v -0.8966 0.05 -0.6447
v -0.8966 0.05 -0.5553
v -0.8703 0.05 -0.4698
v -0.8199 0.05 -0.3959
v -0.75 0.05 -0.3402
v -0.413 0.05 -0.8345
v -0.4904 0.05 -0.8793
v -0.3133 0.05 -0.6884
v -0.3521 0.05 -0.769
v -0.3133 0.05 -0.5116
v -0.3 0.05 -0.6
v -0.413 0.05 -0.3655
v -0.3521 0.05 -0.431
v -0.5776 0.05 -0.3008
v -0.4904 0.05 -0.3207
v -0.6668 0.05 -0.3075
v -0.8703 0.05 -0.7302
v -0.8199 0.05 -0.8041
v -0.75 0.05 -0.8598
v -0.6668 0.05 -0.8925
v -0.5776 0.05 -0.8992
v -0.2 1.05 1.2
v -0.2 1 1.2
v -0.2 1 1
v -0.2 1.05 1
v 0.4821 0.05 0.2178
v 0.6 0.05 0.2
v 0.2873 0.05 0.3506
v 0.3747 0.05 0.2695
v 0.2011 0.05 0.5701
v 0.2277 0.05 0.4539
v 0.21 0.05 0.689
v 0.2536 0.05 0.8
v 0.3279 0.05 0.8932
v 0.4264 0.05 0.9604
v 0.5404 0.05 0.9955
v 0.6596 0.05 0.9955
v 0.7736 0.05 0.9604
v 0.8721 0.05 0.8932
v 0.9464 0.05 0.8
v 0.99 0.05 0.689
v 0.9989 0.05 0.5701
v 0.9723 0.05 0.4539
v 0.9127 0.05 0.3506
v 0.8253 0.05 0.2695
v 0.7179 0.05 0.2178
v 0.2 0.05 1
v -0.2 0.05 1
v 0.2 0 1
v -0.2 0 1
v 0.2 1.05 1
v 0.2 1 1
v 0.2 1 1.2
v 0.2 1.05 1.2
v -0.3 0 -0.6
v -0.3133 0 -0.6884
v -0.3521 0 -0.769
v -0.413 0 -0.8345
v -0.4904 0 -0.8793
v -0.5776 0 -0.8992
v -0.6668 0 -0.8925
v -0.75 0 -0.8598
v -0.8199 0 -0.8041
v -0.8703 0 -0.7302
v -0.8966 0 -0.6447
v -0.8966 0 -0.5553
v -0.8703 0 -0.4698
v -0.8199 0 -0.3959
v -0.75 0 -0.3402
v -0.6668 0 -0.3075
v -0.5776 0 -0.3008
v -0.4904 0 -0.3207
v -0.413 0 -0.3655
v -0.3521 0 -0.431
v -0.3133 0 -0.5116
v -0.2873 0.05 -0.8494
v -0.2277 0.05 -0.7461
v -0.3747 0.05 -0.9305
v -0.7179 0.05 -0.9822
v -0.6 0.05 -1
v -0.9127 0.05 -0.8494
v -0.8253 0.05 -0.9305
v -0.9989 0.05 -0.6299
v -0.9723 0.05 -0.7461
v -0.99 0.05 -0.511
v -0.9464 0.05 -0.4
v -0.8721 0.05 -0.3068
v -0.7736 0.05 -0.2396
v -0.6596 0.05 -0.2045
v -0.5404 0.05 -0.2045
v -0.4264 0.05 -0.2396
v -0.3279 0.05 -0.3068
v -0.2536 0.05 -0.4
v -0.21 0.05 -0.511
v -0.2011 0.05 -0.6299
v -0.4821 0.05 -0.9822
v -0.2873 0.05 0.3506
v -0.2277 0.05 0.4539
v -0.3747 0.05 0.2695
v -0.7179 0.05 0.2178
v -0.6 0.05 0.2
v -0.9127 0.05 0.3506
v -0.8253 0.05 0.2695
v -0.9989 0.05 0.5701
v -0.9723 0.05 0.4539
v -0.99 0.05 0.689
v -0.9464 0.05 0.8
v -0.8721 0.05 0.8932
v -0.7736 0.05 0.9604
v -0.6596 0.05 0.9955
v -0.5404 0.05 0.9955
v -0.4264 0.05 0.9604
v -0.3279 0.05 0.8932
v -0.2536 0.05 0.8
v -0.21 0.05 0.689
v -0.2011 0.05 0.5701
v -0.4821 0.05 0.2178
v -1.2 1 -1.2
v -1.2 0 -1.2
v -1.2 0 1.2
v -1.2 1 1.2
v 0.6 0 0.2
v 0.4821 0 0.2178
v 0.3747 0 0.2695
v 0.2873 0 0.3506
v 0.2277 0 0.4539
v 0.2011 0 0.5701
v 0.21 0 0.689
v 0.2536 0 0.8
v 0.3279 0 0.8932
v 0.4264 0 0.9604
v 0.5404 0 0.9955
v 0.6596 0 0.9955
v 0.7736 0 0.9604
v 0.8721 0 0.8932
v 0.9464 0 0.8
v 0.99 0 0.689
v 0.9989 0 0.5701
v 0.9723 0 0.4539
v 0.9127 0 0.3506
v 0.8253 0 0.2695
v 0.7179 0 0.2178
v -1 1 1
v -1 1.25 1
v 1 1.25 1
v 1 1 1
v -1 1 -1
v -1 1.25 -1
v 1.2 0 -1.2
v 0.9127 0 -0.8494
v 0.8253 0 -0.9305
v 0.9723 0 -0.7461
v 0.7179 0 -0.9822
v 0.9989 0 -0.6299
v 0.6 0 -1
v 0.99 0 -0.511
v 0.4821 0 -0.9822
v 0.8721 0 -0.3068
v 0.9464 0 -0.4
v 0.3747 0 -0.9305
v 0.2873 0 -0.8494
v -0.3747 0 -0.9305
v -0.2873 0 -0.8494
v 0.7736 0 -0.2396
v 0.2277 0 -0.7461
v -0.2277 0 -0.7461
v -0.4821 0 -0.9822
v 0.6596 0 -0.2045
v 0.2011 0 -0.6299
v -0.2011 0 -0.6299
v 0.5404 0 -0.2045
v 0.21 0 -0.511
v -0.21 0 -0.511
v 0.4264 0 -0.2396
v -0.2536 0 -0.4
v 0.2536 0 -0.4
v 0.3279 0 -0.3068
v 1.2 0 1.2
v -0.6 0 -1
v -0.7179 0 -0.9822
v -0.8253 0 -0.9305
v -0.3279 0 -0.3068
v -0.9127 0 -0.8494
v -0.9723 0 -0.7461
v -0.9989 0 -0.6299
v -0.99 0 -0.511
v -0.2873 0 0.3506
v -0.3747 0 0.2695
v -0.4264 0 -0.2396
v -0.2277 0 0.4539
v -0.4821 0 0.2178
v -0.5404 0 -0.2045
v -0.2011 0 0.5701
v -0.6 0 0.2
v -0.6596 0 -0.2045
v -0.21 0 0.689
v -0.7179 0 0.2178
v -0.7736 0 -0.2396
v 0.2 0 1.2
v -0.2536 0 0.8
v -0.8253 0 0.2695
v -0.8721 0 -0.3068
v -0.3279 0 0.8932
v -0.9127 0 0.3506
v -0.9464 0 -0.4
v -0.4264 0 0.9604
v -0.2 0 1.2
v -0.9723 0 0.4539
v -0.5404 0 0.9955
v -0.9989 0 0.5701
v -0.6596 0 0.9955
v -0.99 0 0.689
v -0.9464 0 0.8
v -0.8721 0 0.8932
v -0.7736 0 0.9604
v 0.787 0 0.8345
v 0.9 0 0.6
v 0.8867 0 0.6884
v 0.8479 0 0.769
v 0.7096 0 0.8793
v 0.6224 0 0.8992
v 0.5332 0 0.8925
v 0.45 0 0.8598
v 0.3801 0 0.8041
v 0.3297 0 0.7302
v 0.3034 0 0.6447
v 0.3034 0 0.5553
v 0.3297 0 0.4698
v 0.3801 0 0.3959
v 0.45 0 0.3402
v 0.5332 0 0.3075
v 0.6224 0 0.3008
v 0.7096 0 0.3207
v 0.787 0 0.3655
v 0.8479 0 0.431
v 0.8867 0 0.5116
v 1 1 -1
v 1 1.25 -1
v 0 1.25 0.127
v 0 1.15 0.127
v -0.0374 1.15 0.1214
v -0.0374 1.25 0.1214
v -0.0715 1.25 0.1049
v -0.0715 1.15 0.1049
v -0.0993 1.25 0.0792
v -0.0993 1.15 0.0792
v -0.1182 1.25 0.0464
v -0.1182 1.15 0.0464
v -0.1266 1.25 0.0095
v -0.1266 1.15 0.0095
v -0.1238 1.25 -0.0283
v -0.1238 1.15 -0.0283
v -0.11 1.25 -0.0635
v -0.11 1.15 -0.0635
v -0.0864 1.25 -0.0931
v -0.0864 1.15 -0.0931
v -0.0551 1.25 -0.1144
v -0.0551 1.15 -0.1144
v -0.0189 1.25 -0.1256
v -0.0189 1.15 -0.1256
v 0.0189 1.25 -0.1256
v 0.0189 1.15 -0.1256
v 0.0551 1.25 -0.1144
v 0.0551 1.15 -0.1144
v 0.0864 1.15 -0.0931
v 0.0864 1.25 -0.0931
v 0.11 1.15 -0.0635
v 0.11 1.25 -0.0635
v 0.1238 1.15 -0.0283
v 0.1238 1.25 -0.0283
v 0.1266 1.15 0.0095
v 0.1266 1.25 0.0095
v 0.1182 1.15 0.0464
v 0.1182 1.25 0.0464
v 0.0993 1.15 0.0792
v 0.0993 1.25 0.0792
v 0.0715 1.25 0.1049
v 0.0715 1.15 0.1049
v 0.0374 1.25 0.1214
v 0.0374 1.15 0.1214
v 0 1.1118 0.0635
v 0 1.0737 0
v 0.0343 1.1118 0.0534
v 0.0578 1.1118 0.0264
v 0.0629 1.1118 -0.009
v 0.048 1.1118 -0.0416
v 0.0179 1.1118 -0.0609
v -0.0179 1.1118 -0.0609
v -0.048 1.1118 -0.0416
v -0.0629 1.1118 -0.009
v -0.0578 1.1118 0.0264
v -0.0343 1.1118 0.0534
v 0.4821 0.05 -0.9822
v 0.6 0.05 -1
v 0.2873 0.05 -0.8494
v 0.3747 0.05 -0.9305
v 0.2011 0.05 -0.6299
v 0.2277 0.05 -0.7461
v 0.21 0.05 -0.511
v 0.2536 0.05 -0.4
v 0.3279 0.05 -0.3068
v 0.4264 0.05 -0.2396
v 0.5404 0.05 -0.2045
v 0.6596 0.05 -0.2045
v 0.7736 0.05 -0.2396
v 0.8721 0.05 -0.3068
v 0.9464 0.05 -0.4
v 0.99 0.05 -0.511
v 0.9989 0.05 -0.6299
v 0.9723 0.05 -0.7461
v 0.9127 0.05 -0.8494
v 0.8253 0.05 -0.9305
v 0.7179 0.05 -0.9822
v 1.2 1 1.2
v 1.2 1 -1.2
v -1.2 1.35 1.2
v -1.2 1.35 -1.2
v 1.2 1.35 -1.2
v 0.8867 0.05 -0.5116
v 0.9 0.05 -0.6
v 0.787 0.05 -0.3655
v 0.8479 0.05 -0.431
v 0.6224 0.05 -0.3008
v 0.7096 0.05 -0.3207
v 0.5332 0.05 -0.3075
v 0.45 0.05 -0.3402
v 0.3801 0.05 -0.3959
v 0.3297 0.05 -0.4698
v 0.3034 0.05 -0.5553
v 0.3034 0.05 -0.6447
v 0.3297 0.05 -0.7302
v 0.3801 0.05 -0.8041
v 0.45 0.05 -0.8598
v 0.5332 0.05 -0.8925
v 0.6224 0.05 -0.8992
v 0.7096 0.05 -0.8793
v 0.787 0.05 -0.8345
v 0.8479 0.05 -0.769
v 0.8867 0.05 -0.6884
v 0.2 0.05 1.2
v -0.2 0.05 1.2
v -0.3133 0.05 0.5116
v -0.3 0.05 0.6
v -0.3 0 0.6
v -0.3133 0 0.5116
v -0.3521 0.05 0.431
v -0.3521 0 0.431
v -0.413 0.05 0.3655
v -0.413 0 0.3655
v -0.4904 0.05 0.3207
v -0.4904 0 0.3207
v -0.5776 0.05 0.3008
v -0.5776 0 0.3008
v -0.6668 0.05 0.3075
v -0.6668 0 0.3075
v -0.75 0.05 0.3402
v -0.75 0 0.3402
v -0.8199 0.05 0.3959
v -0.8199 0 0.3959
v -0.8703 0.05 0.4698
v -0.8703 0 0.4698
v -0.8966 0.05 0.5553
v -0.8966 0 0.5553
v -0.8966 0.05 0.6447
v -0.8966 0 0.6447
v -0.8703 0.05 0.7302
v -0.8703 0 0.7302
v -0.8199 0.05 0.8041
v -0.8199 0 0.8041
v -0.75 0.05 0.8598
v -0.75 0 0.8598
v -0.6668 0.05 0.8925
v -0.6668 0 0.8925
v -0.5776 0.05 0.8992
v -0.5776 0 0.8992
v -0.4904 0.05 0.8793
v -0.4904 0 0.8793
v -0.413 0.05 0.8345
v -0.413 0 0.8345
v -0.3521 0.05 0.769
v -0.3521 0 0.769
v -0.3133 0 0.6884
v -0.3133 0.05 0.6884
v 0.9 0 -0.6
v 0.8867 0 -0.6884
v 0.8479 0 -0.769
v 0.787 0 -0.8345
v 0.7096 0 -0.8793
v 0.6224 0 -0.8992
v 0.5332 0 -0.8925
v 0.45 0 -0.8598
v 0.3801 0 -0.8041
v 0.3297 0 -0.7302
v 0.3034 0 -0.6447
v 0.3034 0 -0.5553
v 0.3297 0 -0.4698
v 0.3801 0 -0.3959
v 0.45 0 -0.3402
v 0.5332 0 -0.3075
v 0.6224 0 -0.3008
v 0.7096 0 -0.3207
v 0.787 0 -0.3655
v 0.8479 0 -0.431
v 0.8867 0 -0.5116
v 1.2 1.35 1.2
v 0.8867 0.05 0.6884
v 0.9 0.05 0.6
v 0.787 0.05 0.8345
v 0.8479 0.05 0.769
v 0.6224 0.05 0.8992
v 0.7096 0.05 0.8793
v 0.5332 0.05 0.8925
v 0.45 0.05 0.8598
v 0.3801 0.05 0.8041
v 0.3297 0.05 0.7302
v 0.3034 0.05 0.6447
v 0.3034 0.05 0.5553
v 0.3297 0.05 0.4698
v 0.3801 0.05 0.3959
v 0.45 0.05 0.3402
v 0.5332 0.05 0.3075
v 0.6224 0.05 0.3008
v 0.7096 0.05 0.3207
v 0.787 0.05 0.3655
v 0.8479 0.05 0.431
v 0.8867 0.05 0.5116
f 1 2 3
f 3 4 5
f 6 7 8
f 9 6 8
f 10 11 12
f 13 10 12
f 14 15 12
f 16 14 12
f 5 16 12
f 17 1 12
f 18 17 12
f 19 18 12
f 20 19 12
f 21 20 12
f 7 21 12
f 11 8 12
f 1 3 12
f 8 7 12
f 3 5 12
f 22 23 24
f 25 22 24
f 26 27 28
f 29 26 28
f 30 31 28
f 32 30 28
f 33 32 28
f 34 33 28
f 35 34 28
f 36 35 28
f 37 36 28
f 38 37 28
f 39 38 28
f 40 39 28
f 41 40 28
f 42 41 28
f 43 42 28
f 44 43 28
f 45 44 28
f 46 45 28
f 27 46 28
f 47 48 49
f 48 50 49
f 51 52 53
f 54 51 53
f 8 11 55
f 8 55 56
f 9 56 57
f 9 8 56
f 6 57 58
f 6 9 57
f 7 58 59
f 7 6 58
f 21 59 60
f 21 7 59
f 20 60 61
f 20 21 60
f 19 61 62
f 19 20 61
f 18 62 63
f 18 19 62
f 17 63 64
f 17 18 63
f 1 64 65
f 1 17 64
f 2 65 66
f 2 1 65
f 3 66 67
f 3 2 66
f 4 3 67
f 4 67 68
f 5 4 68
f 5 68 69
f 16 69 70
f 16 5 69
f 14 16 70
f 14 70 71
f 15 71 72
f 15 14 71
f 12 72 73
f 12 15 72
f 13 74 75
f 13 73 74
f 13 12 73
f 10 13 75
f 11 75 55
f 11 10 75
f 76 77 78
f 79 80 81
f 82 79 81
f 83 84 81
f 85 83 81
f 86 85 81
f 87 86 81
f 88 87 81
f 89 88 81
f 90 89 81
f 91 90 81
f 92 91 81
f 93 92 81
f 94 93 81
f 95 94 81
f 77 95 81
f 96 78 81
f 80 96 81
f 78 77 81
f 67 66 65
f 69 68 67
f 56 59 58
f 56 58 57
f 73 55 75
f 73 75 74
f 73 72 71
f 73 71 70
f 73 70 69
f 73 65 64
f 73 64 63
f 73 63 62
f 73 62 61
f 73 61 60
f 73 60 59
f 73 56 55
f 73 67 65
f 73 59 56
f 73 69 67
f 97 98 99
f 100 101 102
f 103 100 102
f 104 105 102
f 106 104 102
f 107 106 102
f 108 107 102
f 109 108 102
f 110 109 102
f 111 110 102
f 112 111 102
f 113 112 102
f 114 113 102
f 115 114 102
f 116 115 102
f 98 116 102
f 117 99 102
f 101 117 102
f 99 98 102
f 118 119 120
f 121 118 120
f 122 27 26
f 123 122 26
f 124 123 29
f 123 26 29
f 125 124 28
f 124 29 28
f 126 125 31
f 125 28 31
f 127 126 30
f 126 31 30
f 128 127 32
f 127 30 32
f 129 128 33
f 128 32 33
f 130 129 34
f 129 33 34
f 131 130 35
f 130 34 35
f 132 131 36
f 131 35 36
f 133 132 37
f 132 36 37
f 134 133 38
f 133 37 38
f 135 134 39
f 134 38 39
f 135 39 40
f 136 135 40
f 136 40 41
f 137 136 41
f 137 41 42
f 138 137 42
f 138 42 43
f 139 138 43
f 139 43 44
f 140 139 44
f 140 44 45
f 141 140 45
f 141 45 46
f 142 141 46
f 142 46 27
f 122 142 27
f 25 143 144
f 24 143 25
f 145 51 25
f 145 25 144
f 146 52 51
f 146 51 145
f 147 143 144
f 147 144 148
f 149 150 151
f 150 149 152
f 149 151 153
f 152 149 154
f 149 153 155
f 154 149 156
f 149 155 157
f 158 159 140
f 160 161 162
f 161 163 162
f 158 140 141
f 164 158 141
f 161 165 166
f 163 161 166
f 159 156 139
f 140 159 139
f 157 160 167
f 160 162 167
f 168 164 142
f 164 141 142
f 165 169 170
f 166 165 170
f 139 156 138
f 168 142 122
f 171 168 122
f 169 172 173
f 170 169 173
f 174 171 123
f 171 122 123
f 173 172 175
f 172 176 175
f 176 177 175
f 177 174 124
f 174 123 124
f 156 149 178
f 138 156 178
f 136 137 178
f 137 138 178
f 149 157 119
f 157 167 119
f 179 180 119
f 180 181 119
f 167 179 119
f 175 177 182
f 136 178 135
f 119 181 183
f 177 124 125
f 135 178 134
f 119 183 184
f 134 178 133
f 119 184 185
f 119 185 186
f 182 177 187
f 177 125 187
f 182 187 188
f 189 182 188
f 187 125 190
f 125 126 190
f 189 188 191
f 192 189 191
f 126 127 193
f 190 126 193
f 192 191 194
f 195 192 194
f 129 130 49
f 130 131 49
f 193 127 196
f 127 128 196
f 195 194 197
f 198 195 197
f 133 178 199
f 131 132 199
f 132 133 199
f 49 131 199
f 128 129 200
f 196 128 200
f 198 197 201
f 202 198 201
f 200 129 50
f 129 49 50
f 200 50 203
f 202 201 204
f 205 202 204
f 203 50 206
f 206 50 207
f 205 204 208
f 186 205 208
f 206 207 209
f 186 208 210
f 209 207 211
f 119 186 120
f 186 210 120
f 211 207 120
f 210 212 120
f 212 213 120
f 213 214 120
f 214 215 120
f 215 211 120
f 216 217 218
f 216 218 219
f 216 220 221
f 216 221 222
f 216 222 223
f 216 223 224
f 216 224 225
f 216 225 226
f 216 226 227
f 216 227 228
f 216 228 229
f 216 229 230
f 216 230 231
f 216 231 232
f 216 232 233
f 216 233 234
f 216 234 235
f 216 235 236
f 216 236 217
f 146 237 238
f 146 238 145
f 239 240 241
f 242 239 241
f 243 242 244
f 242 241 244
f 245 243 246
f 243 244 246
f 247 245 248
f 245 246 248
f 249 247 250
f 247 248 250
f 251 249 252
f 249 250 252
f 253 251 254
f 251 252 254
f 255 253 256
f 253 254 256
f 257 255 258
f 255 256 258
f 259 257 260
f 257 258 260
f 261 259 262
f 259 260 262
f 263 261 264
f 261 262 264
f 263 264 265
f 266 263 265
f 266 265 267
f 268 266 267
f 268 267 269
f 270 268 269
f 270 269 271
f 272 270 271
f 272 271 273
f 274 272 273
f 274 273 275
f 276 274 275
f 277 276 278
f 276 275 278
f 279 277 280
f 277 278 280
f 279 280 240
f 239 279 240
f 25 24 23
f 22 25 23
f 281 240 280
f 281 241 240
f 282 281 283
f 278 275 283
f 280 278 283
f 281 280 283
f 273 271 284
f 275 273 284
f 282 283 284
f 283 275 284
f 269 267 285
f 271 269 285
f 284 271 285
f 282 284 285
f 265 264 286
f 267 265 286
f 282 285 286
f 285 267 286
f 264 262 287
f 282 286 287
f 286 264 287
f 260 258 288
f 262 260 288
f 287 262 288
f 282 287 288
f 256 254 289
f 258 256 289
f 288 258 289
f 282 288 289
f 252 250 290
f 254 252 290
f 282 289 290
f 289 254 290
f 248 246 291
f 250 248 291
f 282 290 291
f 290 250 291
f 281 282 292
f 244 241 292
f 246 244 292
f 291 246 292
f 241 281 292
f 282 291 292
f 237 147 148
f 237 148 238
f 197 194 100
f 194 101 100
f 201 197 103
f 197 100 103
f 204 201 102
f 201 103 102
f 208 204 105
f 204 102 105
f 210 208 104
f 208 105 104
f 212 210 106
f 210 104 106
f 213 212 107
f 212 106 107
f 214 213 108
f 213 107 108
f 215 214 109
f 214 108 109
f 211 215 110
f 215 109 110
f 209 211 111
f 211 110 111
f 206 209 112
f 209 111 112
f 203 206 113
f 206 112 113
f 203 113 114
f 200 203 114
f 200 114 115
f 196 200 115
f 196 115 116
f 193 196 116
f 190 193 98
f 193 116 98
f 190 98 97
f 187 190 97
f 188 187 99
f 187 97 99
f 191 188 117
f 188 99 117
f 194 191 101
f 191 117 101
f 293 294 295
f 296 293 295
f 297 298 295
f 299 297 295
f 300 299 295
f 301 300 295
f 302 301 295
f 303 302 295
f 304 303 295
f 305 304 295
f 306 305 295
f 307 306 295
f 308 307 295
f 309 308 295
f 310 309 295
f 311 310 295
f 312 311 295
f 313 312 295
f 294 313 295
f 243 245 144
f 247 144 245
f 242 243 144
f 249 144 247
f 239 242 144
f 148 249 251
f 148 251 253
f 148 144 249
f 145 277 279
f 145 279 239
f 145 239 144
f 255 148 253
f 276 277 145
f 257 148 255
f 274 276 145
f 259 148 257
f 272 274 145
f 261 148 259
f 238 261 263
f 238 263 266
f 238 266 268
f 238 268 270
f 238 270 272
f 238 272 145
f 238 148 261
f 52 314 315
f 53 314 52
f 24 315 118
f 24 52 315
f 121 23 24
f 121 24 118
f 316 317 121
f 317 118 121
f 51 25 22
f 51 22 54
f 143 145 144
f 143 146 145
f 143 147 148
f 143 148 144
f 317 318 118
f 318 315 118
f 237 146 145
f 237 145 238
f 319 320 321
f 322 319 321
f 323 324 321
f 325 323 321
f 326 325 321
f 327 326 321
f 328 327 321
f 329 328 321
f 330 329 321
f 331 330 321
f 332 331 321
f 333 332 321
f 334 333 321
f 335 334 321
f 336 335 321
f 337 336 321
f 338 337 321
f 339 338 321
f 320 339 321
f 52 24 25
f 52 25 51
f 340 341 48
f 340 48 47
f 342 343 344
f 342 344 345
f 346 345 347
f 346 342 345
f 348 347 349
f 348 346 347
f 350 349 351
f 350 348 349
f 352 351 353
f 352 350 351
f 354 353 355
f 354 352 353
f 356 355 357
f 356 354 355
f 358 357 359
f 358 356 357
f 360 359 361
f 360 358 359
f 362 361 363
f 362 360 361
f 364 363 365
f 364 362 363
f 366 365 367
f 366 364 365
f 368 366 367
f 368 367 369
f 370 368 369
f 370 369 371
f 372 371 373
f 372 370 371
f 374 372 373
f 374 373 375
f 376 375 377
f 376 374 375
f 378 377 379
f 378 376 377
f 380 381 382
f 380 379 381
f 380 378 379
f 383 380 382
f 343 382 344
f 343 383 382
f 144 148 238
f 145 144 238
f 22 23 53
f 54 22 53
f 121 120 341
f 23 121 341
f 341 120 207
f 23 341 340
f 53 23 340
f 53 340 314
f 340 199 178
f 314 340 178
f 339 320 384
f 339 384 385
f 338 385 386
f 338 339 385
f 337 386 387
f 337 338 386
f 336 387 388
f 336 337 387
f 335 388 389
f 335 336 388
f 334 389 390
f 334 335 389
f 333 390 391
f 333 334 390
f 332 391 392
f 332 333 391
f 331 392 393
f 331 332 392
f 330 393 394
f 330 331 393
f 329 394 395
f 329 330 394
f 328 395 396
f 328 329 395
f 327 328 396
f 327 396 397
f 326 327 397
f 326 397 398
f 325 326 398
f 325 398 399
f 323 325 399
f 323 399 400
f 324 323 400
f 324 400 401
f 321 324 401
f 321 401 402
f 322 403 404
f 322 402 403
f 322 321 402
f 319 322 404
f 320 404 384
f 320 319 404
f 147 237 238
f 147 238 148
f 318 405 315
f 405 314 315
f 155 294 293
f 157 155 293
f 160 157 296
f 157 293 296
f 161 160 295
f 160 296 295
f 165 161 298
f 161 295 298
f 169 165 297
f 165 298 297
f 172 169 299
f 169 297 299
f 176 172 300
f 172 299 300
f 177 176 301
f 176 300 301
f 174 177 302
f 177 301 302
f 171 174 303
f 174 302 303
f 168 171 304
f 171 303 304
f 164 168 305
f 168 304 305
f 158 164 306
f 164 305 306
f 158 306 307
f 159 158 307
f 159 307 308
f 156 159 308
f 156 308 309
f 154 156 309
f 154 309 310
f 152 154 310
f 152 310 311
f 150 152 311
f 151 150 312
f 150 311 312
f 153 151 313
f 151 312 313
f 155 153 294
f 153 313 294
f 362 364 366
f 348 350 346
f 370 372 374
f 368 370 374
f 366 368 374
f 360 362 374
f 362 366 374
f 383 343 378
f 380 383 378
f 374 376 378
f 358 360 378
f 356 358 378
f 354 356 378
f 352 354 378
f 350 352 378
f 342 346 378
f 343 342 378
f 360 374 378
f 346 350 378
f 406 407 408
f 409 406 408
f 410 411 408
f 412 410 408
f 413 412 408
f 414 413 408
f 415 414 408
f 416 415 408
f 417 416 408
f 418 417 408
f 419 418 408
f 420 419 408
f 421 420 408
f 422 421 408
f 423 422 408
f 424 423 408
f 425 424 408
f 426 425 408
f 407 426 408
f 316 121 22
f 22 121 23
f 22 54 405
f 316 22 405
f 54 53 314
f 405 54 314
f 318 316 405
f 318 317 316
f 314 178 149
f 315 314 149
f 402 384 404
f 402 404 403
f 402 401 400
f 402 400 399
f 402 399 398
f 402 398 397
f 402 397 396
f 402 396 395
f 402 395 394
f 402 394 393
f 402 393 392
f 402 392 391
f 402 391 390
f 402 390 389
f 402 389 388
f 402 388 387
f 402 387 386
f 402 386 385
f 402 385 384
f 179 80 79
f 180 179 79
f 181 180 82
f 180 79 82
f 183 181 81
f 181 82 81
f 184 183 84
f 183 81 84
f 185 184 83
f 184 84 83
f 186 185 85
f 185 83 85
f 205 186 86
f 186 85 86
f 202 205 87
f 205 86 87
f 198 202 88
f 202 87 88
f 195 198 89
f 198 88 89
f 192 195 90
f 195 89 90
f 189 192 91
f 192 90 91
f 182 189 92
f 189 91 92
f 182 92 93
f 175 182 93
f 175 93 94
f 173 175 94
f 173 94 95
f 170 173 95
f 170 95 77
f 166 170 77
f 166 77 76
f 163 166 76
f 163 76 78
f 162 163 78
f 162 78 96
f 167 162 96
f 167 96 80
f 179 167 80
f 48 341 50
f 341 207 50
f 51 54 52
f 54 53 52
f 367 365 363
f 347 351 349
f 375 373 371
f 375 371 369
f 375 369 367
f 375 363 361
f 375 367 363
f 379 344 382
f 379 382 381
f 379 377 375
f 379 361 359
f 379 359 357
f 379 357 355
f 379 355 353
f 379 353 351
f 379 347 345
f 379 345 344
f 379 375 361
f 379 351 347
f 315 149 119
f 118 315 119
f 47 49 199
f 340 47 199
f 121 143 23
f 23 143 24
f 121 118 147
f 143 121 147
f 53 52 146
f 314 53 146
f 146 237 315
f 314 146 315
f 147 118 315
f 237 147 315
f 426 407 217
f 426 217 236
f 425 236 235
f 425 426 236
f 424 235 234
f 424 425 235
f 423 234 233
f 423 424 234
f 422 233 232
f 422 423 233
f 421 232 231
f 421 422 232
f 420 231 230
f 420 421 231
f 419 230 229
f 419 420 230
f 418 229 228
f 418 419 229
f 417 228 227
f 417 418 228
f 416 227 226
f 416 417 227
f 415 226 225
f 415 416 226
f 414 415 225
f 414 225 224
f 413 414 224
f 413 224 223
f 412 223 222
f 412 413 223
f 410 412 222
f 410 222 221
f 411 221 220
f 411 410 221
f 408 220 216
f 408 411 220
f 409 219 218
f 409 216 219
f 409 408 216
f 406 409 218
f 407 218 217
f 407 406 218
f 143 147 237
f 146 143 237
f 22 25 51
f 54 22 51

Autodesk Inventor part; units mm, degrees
ref_plane "YZ Plane" through (0, 0, 0) normal (1, 0, 0) x (0, 1, 0)
ref_plane "XZ Plane" through (0, 0, 0) normal (0, 1, 0) x (-1, 0, 0)
ref_plane "XY Plane" through (0, 0, 0) normal (0, 0, 1) x (1, 0, 0)
sketch "Sketch1" plane through (0, 0, 0) normal (0, 1, 0) x (-1, 0, 0)
  line L0 (1.2, 1.2) -> (-1.2, 1.2)
  line L1 (-1.2, 1.2) -> (-1.2, -1.2)
  line L2 (-1.2, -1.2) -> (1.2, -1.2)
  line L3 (1.2, -1.2) -> (1.2, 1.2)
  line L4 (1.2, 1.2) -> (-1.2, -1.2) construction
  line L5 (-1.2, 1.2) -> (1.2, -1.2) construction
  point P0 (0, 0)
  dimension "d0" = 2.4
  dimension "d1" = 2.4
extrude "Extrusion1" add sketch "Sketch1" along normal blind 1
sketch "Sketch2" plane through (0, 1, 0) normal (0, 1, 0) x (1, 0, 0)
  line L0 (1, -1) -> (-1, -1)
  line L1 (-1, -1) -> (-1, 1)
  line L2 (-1, 1) -> (1, 1)
  line L3 (1, 1) -> (1, -1)
  line L4 (1, -1) -> (-1, 1) construction
  line L5 (-1, -1) -> (1, 1) construction
  point P0 (0, 0)
  dimension "d4" = 2
  dimension "d5" = 2
extrude "Extrusion2" add sketch "Sketch2" along normal blind 0.25 separate body
sketch "Sketch8" plane through (0, 1, 0) normal (0, 1, 0) x (1, 0, 0)
  line L0 (-1.2, -1.2) -> (1.2, -1.2) projected
  line L1 (1.2, -1.2) -> (1.2, 1.2) projected
  line L2 (1.2, 1.2) -> (-1.2, 1.2) projected
  line L3 (-1.2, 1.2) -> (-1.2, -1.2) projected
  line L4 (-1, -1) -> (1, -1) projected
  line L5 (-0.2, -1.2) -> (0.2, -1.2)
  line L6 (0.2, -1.2) -> (0.2, -1)
  line L7 (0.2, -1) -> (-0.2, -1)
  line L8 (-0.2, -1) -> (-0.2, -1.2)
  point P0 (0, 0)
  point P1 (0, -1)
  point P2 (0, -1.2)
  dimension "d49" = 0.4
extrude "Extrusion6" add sketch "Sketch8" along normal blind 0.05 contours L8 L4 L6 L0 bodies 1
sketch "Sketch3" plane through (0, 1, 0) normal (0, 1, 0) x (1, 0, 0)
  line L0 (-1.2, -1.2) -> (-0.2, -1.2) projected
  line L1 (1.2, -1.2) -> (1.2, 1.2) projected
  line L2 (1.2, 1.2) -> (-1.2, 1.2) projected
  line L3 (-1.2, 1.2) -> (-1.2, -1.2) projected
  line L4 (-1, -1) -> (1, -1) projected
  line L5 (1, -1) -> (1, 1) projected
  line L6 (1, 1) -> (-1, 1) projected
  line L7 (-1, 1) -> (-1, -1) projected
  line L8 (0.2, -1) -> (0.2, -1.2) projected
  line L9 (0.2, -1.2) -> (1.2, -1.2) projected
  line L10 (-0.2, -1.2) -> (-0.2, -1) projected
  line L11 (-0.2, -1) -> (0.2, -1) projected
  point P0 (0, 0)
extrude "Extrusion3" add sketch "Sketch3" along normal blind 0.35 separate body contours L3 L2 L1 L9 L8 L4 L5 L6 L7 L10 L0
sketch "Sketch9" plane through (0, 1.05, 0) normal (0, 1, 0) x (1, 0, 0)
  point P0 (0, 0)
sketch "Sketch10" plane through (0, 1.35, 0) normal (0, 1, 0) x (1, 0, 0)
  line L0 (-0.2, -1.2) -> (0.2, -1.2) projected
  line L1 (0.2, -1.2) -> (0.2, -1) projected
  line L2 (0.2, -1) -> (-0.2, -1) projected
  line L3 (-0.2, -1) -> (-0.2, -1.2) projected
  point P0 (0, 0)
extrude "Extrusion7" add sketch "Sketch10" against normal up to surface (0.3 mm away) bodies 3
sketch "Sketch5" plane through (0, 1.25, 0) normal (0, 1, 0) x (1, 0, 0)
  point P0 (0, 0)
  point P1 (0, 0)
hole "Hole1" at (0, 1.25, 0) direction (0, -1, 0) diameter 0.254 depth 0.1 tip angle 118 bodies 2
sketch "Sketch4" plane through (0, 1.35, 0) normal (0, 1, 0) x (1, 0, 0)
  line L0 (-1, -1) -> (-1, 1) projected
  line L1 (-1, 1) -> (1, 1) projected
  line L2 (1, 1) -> (1, -1) projected
  line L3 (1, -1) -> (-1, -1) projected
  line L4 (1.2, -1.2) -> (1.2, 1.2) projected
  line L5 (1.2, 1.2) -> (-1.2, 1.2) projected
  line L6 (-1.2, 1.2) -> (-1.2, -1.2) projected
  line L7 (-1.2, -1.2) -> (1.2, -1.2) projected
  point P0 (0, 0)
extrude "Extrusion4" add sketch "Sketch4" against normal up to surface (0.1 mm away) contours L0 L1 L2 L3 bodies 3
sketch "Sketch6" plane through (0, 0, 0) normal (0, -1, 0) x (1, 0, 0)
  line L0 (0.6, 0.6) -> (-0.6, 0.6)
  line L1 (-0.6, 0.6) -> (-0.6, -0.6)
  line L2 (-0.6, -0.6) -> (0.6, -0.6)
  line L3 (0.6, -0.6) -> (0.6, 0.6)
  line L4 (0.6, 0.6) -> (-0.6, -0.6) construction
  line L5 (-0.6, 0.6) -> (0.6, -0.6) construction
  point P0 (0, 0)
  point P1 (0, 0)
  point P2 (0, 0)
  dimension "d19" = 1.2
  dimension "d20" = 1.2
hole "Hole2" at (0.6, 0, -0.6) at (-0.6, 0, -0.6) at (0.6, 0, 0.6) at (-0.6, 0, 0.6) direction (0, 1, 0) diameter 0.8 depth 0.05 bodies 1
sketch "Sketch11" plane through (0, 0, 0) normal (0, -1, 0) x (1, 0, 0)
  circle A0 centre (0.6, -0.6) radius 0.4 projected
  circle A1 centre (-0.6, -0.6) radius 0.4 projected
  circle A2 centre (0.6, 0.6) radius 0.4 projected
  line L0 (-1.2, 1.2) -> (1.2, 1.2) projected
  line L1 (-1.2, -1.2) -> (-1.2, 1.2) projected
  line L2 (1.2, -1.2) -> (-1.2, -1.2) projected
  line L3 (1.2, 1.2) -> (1.2, -1.2) projected
  line L4 (0.2, 1.2) -> (-0.2, 1.2)
  line L5 (-0.2, 1.2) -> (-0.2, 1)
  line L6 (-0.2, 1) -> (0.2, 1)
  line L7 (0.2, 1) -> (0.2, 1.2)
  line L8 (-1.2, 1.2) -> (1.2, 1.2) projected
  point P0 (0, 0)
  point P1 (0, 1.2)
  point P2 (0, 1.2)
  dimension "d41" = 0.4
  dimension "d42" = 0.2
extrude "Extrusion8" cut sketch "Sketch11" against normal blind 0.05 contours L0 L7 L6 L5 bodies 1
sketch "Sketch12" plane through (0.6, 0.05, -0.6) normal (0, -1, 0) x (1, 0, 0)
  circle A0 centre (0, 0) radius 0.4 projected
  circle A1 centre (-1.2, 0) radius 0.4 projected
  circle A2 centre (0, 1.2) radius 0.4 projected
  circle A3 centre (-1.2, 1.2) radius 0.4 projected
  circle A4 centre (0, 0) radius 0.3
  circle A5 centre (-1.2, 0) radius 0.3
  circle A6 centre (-1.2, 1.2) radius 0.3
  circle A7 centre (0, 1.2) radius 0.3
  dimension "d46" = 0.6
extrude "Extrusion9" add sketch "Sketch12" along normal up to surface (0.05 mm away) separate body contours A4 | A5 | A6 | A7
properties part number "13360-30xxVE" material "ABS Plastic"
